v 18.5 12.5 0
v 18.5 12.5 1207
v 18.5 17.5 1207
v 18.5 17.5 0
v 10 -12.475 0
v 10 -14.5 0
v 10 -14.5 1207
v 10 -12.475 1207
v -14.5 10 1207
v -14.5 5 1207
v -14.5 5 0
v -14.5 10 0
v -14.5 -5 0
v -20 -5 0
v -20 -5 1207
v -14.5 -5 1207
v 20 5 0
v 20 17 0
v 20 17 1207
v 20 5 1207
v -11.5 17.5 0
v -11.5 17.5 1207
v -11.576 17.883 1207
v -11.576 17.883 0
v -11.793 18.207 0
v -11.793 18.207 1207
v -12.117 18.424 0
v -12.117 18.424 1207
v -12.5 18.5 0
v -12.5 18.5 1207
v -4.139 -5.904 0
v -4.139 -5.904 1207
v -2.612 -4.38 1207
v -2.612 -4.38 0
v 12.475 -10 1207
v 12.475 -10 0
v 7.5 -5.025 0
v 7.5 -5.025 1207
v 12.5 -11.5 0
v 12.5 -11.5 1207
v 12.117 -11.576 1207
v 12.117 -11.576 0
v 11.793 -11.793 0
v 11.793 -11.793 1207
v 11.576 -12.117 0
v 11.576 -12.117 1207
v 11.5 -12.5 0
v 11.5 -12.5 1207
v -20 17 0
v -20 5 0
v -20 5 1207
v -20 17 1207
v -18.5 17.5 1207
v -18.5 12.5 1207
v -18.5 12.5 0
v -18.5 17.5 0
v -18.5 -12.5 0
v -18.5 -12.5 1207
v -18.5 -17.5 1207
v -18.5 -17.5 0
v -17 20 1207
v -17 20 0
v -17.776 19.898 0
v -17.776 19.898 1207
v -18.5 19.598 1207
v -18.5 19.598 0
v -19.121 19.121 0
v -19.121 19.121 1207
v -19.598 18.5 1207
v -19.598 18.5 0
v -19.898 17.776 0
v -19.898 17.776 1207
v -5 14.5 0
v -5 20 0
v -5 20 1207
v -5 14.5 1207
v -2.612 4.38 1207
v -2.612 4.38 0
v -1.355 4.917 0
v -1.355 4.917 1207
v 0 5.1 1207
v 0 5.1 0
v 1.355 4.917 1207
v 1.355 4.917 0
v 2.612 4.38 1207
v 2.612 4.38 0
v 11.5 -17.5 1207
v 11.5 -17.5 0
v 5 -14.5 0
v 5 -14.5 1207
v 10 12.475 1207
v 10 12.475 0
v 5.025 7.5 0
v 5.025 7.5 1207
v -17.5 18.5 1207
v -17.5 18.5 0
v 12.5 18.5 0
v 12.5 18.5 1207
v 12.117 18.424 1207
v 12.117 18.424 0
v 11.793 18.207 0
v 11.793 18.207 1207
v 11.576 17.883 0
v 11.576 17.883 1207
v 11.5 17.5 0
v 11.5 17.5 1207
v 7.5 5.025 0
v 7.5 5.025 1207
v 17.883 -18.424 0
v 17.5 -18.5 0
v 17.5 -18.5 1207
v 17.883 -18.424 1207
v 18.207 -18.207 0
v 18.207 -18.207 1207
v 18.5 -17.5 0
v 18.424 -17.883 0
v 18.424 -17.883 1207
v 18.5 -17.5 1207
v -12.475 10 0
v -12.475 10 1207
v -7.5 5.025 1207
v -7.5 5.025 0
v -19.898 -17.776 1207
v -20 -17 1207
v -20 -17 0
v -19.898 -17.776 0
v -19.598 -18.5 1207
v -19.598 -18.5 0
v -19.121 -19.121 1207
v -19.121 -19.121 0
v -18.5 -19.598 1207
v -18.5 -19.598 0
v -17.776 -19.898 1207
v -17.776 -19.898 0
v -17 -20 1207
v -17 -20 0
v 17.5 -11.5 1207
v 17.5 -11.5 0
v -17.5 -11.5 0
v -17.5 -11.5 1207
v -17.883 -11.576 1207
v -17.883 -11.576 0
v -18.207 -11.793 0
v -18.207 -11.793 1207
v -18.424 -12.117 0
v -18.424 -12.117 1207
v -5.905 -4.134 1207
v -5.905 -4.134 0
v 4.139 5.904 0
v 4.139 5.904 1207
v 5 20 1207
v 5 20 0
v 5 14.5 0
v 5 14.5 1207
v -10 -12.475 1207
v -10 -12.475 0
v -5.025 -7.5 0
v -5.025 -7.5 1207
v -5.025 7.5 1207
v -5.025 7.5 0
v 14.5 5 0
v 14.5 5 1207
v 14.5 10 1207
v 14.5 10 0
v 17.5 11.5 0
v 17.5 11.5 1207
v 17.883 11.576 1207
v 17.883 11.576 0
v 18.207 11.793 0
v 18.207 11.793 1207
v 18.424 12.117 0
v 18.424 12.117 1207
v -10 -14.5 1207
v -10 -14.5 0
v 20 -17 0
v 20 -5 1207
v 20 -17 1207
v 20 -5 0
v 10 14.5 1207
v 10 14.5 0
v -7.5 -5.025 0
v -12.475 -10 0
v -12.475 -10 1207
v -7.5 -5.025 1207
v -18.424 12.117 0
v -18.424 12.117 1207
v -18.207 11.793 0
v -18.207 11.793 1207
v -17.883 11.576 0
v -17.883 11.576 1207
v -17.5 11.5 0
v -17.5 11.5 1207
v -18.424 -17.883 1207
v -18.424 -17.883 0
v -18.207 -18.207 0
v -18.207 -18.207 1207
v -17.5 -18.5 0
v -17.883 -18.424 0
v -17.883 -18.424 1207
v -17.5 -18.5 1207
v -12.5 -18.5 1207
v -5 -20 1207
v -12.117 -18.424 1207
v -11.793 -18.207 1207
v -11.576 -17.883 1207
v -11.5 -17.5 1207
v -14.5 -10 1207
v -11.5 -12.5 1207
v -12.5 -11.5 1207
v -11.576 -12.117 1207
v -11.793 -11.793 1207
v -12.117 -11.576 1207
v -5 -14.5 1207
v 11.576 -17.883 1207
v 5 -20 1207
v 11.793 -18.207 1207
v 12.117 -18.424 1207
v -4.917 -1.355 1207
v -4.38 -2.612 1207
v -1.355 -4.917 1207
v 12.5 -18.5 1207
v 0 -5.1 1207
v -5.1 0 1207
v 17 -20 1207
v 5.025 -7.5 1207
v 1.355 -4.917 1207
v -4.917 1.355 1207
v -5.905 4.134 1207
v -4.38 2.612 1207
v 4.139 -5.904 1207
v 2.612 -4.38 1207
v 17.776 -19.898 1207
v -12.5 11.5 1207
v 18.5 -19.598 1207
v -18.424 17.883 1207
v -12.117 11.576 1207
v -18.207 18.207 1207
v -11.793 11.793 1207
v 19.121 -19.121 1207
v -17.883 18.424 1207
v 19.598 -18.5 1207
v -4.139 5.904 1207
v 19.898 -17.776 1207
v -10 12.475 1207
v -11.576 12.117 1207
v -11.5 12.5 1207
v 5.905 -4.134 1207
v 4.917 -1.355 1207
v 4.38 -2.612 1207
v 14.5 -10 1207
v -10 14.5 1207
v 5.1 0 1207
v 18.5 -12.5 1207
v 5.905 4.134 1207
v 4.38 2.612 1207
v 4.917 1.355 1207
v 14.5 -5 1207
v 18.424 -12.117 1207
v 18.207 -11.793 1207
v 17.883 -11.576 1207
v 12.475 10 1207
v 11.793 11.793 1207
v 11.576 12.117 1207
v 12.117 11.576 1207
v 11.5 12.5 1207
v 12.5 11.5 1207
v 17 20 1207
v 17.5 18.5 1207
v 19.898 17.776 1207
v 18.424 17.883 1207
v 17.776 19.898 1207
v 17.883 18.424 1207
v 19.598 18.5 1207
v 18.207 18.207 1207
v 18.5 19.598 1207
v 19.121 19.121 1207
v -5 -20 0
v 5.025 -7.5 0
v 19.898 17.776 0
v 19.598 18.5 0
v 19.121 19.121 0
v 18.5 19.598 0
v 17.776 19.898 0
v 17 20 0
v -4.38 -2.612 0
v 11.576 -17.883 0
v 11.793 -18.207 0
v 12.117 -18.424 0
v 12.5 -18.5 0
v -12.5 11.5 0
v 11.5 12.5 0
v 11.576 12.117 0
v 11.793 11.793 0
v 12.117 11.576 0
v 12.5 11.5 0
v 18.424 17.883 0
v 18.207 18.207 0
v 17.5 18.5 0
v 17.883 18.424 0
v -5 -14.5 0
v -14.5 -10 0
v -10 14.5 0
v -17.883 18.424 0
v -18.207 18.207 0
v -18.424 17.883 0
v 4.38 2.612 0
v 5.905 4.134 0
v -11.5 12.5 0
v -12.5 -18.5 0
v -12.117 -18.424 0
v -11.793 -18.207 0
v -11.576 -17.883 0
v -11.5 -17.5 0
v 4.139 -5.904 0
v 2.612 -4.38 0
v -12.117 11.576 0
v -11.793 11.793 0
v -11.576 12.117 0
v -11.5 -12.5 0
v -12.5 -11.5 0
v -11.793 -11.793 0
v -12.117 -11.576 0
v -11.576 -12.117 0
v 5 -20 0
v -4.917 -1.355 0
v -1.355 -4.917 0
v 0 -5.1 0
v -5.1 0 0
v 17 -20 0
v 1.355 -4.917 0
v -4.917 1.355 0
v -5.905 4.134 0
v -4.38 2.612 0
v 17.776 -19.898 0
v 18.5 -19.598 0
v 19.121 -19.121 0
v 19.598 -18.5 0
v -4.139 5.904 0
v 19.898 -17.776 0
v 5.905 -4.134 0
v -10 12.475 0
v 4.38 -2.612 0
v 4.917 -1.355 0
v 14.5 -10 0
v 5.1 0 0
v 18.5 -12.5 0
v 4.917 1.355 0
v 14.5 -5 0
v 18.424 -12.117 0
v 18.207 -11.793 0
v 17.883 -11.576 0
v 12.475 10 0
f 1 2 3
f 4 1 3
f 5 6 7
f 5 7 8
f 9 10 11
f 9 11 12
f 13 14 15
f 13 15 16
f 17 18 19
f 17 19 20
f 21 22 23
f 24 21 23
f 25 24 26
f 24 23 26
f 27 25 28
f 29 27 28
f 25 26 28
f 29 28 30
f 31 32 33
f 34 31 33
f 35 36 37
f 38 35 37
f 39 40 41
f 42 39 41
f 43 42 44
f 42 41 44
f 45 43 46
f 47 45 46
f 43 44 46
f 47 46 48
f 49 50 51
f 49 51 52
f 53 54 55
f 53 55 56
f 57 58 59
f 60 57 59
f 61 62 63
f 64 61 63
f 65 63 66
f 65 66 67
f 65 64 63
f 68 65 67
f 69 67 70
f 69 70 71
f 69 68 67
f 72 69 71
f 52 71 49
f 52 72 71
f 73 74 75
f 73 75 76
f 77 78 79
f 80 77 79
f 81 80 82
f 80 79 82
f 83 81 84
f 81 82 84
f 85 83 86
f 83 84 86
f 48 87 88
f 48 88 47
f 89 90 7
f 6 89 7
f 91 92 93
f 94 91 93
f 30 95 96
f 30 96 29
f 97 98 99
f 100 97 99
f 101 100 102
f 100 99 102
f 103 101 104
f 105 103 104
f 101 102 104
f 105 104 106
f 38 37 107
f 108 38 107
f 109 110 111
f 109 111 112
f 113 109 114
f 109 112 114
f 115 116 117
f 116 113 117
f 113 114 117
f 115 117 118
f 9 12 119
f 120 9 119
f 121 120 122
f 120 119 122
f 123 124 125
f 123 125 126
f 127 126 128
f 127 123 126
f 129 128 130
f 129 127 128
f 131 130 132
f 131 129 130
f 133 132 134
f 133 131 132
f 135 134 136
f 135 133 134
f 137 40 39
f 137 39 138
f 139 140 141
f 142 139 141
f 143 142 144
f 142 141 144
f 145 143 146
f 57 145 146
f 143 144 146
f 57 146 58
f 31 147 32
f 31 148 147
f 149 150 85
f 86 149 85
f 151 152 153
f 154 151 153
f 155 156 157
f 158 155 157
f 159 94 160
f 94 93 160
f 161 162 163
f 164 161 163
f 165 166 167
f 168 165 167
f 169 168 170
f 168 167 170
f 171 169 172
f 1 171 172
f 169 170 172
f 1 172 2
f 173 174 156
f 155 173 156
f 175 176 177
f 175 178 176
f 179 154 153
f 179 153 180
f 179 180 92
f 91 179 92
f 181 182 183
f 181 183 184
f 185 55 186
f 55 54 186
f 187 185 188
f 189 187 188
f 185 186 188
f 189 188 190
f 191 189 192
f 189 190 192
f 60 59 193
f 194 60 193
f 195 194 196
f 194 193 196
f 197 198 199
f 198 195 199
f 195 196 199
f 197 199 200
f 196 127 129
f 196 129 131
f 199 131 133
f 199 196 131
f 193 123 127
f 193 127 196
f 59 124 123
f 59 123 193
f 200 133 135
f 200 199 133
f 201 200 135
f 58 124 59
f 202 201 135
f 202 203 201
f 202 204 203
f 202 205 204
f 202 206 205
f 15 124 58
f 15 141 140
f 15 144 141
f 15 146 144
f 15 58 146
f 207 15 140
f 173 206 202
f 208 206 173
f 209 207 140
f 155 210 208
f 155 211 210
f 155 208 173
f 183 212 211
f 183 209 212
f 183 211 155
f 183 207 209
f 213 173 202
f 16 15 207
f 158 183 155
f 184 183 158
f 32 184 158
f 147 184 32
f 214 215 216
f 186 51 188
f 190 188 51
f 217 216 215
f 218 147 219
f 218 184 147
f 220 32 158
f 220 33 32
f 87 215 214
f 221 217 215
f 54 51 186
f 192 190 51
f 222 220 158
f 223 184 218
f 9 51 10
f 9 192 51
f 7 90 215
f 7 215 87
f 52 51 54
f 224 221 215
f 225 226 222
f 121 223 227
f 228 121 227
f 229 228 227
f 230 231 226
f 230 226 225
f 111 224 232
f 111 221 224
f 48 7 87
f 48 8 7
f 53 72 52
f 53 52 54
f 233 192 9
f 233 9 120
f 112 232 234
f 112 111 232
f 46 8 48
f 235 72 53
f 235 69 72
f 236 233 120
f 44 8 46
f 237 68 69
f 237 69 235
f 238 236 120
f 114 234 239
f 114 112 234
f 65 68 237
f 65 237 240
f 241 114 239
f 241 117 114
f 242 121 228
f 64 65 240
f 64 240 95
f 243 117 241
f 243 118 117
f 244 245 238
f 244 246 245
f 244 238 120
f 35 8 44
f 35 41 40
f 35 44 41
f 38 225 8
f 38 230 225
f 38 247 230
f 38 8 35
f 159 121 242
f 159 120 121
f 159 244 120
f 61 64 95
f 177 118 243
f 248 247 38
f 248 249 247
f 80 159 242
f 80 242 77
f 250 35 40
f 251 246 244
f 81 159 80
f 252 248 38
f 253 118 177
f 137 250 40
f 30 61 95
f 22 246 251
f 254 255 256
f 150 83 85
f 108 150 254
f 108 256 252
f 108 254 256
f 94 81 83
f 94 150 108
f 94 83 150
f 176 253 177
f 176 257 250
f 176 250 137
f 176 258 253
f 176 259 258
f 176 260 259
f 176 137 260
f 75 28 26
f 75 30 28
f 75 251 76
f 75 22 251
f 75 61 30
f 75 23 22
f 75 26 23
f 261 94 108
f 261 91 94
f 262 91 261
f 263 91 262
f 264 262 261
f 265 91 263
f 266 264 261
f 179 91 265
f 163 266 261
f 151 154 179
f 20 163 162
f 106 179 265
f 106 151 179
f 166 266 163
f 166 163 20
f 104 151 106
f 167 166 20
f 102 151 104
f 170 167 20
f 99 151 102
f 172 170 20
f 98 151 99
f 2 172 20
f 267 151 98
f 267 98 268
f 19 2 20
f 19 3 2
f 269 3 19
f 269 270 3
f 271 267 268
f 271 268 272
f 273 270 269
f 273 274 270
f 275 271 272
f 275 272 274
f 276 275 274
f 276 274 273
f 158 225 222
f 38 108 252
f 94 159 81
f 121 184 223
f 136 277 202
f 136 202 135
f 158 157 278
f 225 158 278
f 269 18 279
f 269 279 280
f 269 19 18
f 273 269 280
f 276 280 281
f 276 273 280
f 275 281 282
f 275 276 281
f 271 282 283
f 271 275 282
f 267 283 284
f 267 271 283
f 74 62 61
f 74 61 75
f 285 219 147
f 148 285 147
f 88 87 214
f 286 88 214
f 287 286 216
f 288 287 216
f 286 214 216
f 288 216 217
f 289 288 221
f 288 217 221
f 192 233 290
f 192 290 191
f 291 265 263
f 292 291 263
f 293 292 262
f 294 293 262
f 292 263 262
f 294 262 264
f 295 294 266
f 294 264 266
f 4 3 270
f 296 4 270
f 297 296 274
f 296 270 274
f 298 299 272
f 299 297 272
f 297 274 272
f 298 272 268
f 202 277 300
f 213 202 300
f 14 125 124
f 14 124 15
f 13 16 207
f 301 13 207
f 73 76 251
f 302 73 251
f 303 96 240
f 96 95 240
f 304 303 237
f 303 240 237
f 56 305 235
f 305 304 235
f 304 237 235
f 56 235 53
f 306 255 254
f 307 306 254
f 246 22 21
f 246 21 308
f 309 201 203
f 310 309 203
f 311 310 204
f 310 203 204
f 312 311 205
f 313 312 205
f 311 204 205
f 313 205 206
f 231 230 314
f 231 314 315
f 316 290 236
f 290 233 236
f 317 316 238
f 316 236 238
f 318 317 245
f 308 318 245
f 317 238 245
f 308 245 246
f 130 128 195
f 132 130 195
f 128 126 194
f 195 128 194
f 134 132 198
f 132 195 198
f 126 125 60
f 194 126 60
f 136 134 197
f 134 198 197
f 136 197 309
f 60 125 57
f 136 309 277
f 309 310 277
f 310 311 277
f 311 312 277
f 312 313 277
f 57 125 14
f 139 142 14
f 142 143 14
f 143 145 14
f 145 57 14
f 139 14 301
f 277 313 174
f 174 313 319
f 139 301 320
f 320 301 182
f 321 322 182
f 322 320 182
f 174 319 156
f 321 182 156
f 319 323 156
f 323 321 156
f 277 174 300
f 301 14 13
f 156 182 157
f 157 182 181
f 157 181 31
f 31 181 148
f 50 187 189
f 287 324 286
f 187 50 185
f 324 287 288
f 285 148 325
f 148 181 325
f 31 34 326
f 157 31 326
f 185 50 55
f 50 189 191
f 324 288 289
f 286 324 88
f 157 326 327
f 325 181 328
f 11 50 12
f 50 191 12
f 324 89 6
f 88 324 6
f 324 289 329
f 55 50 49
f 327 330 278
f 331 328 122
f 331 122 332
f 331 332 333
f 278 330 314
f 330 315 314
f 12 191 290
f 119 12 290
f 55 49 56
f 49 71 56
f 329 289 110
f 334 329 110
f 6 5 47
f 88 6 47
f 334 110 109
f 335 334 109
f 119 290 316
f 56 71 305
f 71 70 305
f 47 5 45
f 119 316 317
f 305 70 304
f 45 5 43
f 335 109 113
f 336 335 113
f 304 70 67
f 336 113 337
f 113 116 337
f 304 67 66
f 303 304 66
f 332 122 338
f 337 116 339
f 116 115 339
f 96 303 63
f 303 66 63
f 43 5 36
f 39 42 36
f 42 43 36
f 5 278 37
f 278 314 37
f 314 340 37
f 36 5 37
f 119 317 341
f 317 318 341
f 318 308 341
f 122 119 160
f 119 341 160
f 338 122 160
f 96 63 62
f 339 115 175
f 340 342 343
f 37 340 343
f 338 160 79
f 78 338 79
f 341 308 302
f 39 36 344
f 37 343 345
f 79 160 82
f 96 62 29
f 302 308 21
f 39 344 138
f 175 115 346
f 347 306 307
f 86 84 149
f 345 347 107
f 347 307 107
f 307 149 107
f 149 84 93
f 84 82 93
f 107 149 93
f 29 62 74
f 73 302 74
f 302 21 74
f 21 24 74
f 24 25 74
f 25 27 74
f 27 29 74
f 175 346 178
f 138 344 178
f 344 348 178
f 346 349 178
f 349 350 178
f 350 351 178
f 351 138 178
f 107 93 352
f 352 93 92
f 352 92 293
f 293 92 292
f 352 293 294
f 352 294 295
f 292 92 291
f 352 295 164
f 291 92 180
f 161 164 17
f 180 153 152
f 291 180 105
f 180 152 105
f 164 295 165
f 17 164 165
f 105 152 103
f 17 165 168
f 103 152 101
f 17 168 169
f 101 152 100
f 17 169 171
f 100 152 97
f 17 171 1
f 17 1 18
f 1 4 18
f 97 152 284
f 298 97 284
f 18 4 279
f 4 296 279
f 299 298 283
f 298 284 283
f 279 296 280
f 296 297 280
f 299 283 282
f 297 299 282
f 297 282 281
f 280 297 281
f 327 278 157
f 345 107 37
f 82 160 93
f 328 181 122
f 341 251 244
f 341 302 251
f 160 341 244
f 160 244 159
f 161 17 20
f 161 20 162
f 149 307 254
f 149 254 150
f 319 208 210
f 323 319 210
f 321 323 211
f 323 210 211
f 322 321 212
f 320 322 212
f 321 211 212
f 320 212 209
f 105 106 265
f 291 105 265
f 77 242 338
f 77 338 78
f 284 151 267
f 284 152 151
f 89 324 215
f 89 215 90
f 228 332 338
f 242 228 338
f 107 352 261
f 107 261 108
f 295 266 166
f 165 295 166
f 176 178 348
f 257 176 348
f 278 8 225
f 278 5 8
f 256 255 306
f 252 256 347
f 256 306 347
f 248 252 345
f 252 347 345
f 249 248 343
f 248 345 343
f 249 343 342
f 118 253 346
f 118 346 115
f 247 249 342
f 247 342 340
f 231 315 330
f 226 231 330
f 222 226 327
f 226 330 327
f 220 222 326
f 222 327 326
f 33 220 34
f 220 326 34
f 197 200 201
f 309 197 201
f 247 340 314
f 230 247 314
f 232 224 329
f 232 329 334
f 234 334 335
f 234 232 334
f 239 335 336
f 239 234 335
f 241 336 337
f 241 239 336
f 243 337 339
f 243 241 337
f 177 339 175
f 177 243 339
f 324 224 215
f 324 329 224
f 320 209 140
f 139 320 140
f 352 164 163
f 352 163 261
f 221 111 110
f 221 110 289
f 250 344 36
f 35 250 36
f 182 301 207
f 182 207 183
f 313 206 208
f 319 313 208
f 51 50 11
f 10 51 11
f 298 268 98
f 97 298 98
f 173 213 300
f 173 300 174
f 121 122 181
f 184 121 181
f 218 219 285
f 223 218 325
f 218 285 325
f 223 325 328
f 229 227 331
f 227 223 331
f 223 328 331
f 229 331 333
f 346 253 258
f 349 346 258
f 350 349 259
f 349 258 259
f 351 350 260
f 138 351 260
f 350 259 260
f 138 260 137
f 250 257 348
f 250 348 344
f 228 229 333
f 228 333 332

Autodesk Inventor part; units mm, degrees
ref_plane "YZ Plane" through (0, 0, 0) normal (1, 0, 0) x (0, 1, 0)
ref_plane "XZ Plane" through (0, 0, 0) normal (0, 1, 0) x (-1, 0, 0)
ref_plane "XY Plane" through (0, 0, 0) normal (0, 0, 1) x (1, 0, 0)
sketch "T-Slot 4040 Base" plane through (0, 0, 0) normal (0, 0, 1) x (1, 0, 0)
  line L0 (-28, 0) -> (28, 0) construction
  line L1 (0, -28) -> (0, 28) construction
  circle A0 centre (0, 0) radius 5.1
  line L2 (-7.5, -7.5) -> (7.5, -7.5)
  line L3 (7.5, -7.5) -> (7.5, 7.5)
  line L4 (7.5, 7.5) -> (-7.5, 7.5)
  line L5 (-7.5, 7.5) -> (-7.5, -7.5)
  line L6 (-7.5, -7.5) -> (7.5, 7.5) construction
  line L7 (7.5, -7.5) -> (-7.5, 7.5) construction
  line L8 (-20, 20) -> (20, 20)
  line L9 (20, 20) -> (20, -20)
  line L10 (20, -20) -> (-20, -20)
  line L11 (-20, -20) -> (-20, 20)
  line L12 (-20, 20) -> (20, -20) construction
  line L13 (20, 20) -> (-20, -20) construction
  line L14 (20, 5) -> (14.5, 5)
  line L15 (14.5, 5) -> (14.5, 10)
  line L16 (14.5, 10) -> (12.4749, 10)
  line L17 (12.4749, 10) -> (7.5, 5.0251)
  line L18 (5, 20) -> (5, 14.5)
  line L19 (5, 14.5) -> (10, 14.5)
  line L20 (10, 14.5) -> (10, 12.4749)
  line L21 (10, 12.4749) -> (5.0251, 7.5)
  line L22 (18.5, 18.5) -> (11.5, 18.5)
  line L23 (11.5, 18.5) -> (11.5, 11.5)
  line L24 (11.5, 11.5) -> (18.5, 11.5)
  line L25 (18.5, 11.5) -> (18.5, 18.5)
  line L26 (18.5, 18.5) -> (11.5, 11.5) construction
  line L27 (11.5, 18.5) -> (18.5, 11.5) construction
  line L28 (3.0732, 1.3088) -> (4.38, 2.6125) construction
  line L29 (5.905, 4.1338) -> (4.1393, 5.9037)
  line L30 (4.1393, 5.9037) -> (2.6122, 4.3802)
  line L31 (1.3075, 3.0787) -> (3.0732, 1.3088) construction
  line L32 (3.0732, 1.3088) -> (4.1393, 5.9037) construction
  line L33 (5.905, 4.1338) -> (1.3075, 3.0787) construction
  line L34 (4.38, 2.6125) -> (5.905, 4.1338)
  line L35 (2.6122, 4.3802) -> (1.3075, 3.0787) construction
  line L36 (-20, 5) -> (-14.5, 5)
  line L37 (-14.5, 5) -> (-14.5, 10)
  line L38 (-14.5, 10) -> (-12.4749, 10)
  line L39 (-12.4749, 10) -> (-7.5, 5.0251)
  line L40 (-5, 20) -> (-5, 14.5)
  line L41 (-5, 14.5) -> (-10, 14.5)
  line L42 (-10, 14.5) -> (-10, 12.4749)
  line L43 (-10, 12.4749) -> (-5.0251, 7.5)
  line L44 (-18.5, 18.5) -> (-11.5, 18.5)
  line L45 (-11.5, 18.5) -> (-11.5, 11.5)
  line L46 (-11.5, 11.5) -> (-18.5, 11.5)
  line L47 (-18.5, 11.5) -> (-18.5, 18.5)
  line L48 (-5.905, 4.1338) -> (-4.1393, 5.9037)
  line L49 (-4.1393, 5.9037) -> (-2.6122, 4.3802)
  line L50 (-4.38, 2.6125) -> (-5.905, 4.1338)
  line L51 (7.5, -7.5) -> (-7.5, -7.5)
  line L52 (20, -5) -> (14.5, -5)
  line L53 (14.5, -5) -> (14.5, -10)
  line L54 (14.5, -10) -> (12.4749, -10)
  line L55 (12.4749, -10) -> (7.5, -5.0251)
  line L56 (5, -20) -> (5, -14.5)
  line L57 (5, -14.5) -> (10, -14.5)
  line L58 (10, -14.5) -> (10, -12.4749)
  line L59 (10, -12.4749) -> (5.0251, -7.5)
  line L60 (18.5, -18.5) -> (11.5, -18.5)
  line L61 (11.5, -18.5) -> (11.5, -11.5)
  line L62 (11.5, -11.5) -> (18.5, -11.5)
  line L63 (18.5, -11.5) -> (18.5, -18.5)
  line L64 (18.5, -18.5) -> (11.5, -11.5) construction
  line L65 (11.5, -18.5) -> (18.5, -11.5) construction
  line L66 (3.0732, -1.3088) -> (4.38, -2.6125) construction
  line L67 (5.905, -4.1338) -> (4.1393, -5.9037)
  line L68 (4.1393, -5.9037) -> (2.6122, -4.3802)
  line L69 (1.3075, -3.0787) -> (3.0732, -1.3088) construction
  line L70 (3.0732, -1.3088) -> (4.1393, -5.9037) construction
  line L71 (5.905, -4.1338) -> (1.3075, -3.0787) construction
  line L72 (4.38, -2.6125) -> (5.905, -4.1338)
  line L73 (2.6122, -4.3802) -> (1.3075, -3.0787) construction
  line L74 (-4.38, -2.6125) -> (-5.905, -4.1338)
  line L75 (-4.1393, -5.9037) -> (-2.6122, -4.3802)
  line L76 (-5.905, -4.1338) -> (-4.1393, -5.9037)
  line L77 (-12.4749, -10) -> (-7.5, -5.0251)
  line L78 (-10, -12.4749) -> (-5.0251, -7.5)
  line L79 (-10, -14.5) -> (-10, -12.4749)
  line L80 (-5, -14.5) -> (-10, -14.5)
  line L81 (-5, -20) -> (-5, -14.5)
  line L82 (-18.5, -18.5) -> (-11.5, -18.5)
  line L83 (-11.5, -18.5) -> (-11.5, -11.5)
  line L84 (-11.5, -11.5) -> (-18.5, -11.5)
  line L85 (-18.5, -11.5) -> (-18.5, -18.5)
  line L86 (-14.5, -10) -> (-12.4749, -10)
  line L87 (-14.5, -5) -> (-14.5, -10)
  line L88 (-20, -5) -> (-14.5, -5)
  point P0 (15, 15)
  point P1 (3.6062, 3.6062)
  point P2 (3.6062, 3.6062)
  point P3 (15, -15)
  point P4 (3.6062, -3.6062)
  point P5 (3.6062, -3.6062)
  dimension "d9" = 10.2
  dimension "d12" = 40
  dimension "d13" = 40
  dimension "d14" = 5.5
  dimension "d15" = 15
  dimension "d16" = 7
  dimension "d17" = 10
  dimension "d20" = 1.75
  dimension "d21" = 7
  dimension "d22" = 2
  dimension "d29" = 1.5
  dimension "d30" = 2.5
extrude "Extrusion1" add sketch "T-Slot 4040 Base" along normal blind 1207 contours L5 L4 L3 L2 | L2 L78 L79 L80 L81 L10 L11 L88 L87 L86 L77 L5 | L2 L3 L55 L54 L53 L52 L9 L10 L56 L57 L58 L59 | L39 L38 L37 L36 L11 L8 L40 L41 L42 L43 L4 L5 | L3 L4 L21 L20 L19 L18 L8 L9 L14 L15 L16 L17
fillet "Rundung1" radius 1 16 edges at (11.5, 18.5, 603.5) (18.5, 18.5, 603.5) (18.5, 11.5, 603.5) (11.5, 11.5, 603.5) (-11.5, 18.5, 603.5) (-18.5, 18.5, 603.5) (-18.5, 11.5, 603.5) (-11.5, 11.5, 603.5) (-18.5, -11.5, 603.5) (-11.5, -11.5, 603.5) (-11.5, -18.5, 603.5) (-18.5, -18.5, 603.5) (11.5, -18.5, 603.5) (11.5, -11.5, 603.5) (18.5, -11.5, 603.5) (18.5, -18.5, 603.5)
fillet "Rundung2" radius 3 4 edges at (20, 20, 603.5) (20, -20, 603.5) (-20, -20, 603.5) (-20, 20, 603.5)
properties part number "T-SLOT 4040 B-Type 1207mm"
